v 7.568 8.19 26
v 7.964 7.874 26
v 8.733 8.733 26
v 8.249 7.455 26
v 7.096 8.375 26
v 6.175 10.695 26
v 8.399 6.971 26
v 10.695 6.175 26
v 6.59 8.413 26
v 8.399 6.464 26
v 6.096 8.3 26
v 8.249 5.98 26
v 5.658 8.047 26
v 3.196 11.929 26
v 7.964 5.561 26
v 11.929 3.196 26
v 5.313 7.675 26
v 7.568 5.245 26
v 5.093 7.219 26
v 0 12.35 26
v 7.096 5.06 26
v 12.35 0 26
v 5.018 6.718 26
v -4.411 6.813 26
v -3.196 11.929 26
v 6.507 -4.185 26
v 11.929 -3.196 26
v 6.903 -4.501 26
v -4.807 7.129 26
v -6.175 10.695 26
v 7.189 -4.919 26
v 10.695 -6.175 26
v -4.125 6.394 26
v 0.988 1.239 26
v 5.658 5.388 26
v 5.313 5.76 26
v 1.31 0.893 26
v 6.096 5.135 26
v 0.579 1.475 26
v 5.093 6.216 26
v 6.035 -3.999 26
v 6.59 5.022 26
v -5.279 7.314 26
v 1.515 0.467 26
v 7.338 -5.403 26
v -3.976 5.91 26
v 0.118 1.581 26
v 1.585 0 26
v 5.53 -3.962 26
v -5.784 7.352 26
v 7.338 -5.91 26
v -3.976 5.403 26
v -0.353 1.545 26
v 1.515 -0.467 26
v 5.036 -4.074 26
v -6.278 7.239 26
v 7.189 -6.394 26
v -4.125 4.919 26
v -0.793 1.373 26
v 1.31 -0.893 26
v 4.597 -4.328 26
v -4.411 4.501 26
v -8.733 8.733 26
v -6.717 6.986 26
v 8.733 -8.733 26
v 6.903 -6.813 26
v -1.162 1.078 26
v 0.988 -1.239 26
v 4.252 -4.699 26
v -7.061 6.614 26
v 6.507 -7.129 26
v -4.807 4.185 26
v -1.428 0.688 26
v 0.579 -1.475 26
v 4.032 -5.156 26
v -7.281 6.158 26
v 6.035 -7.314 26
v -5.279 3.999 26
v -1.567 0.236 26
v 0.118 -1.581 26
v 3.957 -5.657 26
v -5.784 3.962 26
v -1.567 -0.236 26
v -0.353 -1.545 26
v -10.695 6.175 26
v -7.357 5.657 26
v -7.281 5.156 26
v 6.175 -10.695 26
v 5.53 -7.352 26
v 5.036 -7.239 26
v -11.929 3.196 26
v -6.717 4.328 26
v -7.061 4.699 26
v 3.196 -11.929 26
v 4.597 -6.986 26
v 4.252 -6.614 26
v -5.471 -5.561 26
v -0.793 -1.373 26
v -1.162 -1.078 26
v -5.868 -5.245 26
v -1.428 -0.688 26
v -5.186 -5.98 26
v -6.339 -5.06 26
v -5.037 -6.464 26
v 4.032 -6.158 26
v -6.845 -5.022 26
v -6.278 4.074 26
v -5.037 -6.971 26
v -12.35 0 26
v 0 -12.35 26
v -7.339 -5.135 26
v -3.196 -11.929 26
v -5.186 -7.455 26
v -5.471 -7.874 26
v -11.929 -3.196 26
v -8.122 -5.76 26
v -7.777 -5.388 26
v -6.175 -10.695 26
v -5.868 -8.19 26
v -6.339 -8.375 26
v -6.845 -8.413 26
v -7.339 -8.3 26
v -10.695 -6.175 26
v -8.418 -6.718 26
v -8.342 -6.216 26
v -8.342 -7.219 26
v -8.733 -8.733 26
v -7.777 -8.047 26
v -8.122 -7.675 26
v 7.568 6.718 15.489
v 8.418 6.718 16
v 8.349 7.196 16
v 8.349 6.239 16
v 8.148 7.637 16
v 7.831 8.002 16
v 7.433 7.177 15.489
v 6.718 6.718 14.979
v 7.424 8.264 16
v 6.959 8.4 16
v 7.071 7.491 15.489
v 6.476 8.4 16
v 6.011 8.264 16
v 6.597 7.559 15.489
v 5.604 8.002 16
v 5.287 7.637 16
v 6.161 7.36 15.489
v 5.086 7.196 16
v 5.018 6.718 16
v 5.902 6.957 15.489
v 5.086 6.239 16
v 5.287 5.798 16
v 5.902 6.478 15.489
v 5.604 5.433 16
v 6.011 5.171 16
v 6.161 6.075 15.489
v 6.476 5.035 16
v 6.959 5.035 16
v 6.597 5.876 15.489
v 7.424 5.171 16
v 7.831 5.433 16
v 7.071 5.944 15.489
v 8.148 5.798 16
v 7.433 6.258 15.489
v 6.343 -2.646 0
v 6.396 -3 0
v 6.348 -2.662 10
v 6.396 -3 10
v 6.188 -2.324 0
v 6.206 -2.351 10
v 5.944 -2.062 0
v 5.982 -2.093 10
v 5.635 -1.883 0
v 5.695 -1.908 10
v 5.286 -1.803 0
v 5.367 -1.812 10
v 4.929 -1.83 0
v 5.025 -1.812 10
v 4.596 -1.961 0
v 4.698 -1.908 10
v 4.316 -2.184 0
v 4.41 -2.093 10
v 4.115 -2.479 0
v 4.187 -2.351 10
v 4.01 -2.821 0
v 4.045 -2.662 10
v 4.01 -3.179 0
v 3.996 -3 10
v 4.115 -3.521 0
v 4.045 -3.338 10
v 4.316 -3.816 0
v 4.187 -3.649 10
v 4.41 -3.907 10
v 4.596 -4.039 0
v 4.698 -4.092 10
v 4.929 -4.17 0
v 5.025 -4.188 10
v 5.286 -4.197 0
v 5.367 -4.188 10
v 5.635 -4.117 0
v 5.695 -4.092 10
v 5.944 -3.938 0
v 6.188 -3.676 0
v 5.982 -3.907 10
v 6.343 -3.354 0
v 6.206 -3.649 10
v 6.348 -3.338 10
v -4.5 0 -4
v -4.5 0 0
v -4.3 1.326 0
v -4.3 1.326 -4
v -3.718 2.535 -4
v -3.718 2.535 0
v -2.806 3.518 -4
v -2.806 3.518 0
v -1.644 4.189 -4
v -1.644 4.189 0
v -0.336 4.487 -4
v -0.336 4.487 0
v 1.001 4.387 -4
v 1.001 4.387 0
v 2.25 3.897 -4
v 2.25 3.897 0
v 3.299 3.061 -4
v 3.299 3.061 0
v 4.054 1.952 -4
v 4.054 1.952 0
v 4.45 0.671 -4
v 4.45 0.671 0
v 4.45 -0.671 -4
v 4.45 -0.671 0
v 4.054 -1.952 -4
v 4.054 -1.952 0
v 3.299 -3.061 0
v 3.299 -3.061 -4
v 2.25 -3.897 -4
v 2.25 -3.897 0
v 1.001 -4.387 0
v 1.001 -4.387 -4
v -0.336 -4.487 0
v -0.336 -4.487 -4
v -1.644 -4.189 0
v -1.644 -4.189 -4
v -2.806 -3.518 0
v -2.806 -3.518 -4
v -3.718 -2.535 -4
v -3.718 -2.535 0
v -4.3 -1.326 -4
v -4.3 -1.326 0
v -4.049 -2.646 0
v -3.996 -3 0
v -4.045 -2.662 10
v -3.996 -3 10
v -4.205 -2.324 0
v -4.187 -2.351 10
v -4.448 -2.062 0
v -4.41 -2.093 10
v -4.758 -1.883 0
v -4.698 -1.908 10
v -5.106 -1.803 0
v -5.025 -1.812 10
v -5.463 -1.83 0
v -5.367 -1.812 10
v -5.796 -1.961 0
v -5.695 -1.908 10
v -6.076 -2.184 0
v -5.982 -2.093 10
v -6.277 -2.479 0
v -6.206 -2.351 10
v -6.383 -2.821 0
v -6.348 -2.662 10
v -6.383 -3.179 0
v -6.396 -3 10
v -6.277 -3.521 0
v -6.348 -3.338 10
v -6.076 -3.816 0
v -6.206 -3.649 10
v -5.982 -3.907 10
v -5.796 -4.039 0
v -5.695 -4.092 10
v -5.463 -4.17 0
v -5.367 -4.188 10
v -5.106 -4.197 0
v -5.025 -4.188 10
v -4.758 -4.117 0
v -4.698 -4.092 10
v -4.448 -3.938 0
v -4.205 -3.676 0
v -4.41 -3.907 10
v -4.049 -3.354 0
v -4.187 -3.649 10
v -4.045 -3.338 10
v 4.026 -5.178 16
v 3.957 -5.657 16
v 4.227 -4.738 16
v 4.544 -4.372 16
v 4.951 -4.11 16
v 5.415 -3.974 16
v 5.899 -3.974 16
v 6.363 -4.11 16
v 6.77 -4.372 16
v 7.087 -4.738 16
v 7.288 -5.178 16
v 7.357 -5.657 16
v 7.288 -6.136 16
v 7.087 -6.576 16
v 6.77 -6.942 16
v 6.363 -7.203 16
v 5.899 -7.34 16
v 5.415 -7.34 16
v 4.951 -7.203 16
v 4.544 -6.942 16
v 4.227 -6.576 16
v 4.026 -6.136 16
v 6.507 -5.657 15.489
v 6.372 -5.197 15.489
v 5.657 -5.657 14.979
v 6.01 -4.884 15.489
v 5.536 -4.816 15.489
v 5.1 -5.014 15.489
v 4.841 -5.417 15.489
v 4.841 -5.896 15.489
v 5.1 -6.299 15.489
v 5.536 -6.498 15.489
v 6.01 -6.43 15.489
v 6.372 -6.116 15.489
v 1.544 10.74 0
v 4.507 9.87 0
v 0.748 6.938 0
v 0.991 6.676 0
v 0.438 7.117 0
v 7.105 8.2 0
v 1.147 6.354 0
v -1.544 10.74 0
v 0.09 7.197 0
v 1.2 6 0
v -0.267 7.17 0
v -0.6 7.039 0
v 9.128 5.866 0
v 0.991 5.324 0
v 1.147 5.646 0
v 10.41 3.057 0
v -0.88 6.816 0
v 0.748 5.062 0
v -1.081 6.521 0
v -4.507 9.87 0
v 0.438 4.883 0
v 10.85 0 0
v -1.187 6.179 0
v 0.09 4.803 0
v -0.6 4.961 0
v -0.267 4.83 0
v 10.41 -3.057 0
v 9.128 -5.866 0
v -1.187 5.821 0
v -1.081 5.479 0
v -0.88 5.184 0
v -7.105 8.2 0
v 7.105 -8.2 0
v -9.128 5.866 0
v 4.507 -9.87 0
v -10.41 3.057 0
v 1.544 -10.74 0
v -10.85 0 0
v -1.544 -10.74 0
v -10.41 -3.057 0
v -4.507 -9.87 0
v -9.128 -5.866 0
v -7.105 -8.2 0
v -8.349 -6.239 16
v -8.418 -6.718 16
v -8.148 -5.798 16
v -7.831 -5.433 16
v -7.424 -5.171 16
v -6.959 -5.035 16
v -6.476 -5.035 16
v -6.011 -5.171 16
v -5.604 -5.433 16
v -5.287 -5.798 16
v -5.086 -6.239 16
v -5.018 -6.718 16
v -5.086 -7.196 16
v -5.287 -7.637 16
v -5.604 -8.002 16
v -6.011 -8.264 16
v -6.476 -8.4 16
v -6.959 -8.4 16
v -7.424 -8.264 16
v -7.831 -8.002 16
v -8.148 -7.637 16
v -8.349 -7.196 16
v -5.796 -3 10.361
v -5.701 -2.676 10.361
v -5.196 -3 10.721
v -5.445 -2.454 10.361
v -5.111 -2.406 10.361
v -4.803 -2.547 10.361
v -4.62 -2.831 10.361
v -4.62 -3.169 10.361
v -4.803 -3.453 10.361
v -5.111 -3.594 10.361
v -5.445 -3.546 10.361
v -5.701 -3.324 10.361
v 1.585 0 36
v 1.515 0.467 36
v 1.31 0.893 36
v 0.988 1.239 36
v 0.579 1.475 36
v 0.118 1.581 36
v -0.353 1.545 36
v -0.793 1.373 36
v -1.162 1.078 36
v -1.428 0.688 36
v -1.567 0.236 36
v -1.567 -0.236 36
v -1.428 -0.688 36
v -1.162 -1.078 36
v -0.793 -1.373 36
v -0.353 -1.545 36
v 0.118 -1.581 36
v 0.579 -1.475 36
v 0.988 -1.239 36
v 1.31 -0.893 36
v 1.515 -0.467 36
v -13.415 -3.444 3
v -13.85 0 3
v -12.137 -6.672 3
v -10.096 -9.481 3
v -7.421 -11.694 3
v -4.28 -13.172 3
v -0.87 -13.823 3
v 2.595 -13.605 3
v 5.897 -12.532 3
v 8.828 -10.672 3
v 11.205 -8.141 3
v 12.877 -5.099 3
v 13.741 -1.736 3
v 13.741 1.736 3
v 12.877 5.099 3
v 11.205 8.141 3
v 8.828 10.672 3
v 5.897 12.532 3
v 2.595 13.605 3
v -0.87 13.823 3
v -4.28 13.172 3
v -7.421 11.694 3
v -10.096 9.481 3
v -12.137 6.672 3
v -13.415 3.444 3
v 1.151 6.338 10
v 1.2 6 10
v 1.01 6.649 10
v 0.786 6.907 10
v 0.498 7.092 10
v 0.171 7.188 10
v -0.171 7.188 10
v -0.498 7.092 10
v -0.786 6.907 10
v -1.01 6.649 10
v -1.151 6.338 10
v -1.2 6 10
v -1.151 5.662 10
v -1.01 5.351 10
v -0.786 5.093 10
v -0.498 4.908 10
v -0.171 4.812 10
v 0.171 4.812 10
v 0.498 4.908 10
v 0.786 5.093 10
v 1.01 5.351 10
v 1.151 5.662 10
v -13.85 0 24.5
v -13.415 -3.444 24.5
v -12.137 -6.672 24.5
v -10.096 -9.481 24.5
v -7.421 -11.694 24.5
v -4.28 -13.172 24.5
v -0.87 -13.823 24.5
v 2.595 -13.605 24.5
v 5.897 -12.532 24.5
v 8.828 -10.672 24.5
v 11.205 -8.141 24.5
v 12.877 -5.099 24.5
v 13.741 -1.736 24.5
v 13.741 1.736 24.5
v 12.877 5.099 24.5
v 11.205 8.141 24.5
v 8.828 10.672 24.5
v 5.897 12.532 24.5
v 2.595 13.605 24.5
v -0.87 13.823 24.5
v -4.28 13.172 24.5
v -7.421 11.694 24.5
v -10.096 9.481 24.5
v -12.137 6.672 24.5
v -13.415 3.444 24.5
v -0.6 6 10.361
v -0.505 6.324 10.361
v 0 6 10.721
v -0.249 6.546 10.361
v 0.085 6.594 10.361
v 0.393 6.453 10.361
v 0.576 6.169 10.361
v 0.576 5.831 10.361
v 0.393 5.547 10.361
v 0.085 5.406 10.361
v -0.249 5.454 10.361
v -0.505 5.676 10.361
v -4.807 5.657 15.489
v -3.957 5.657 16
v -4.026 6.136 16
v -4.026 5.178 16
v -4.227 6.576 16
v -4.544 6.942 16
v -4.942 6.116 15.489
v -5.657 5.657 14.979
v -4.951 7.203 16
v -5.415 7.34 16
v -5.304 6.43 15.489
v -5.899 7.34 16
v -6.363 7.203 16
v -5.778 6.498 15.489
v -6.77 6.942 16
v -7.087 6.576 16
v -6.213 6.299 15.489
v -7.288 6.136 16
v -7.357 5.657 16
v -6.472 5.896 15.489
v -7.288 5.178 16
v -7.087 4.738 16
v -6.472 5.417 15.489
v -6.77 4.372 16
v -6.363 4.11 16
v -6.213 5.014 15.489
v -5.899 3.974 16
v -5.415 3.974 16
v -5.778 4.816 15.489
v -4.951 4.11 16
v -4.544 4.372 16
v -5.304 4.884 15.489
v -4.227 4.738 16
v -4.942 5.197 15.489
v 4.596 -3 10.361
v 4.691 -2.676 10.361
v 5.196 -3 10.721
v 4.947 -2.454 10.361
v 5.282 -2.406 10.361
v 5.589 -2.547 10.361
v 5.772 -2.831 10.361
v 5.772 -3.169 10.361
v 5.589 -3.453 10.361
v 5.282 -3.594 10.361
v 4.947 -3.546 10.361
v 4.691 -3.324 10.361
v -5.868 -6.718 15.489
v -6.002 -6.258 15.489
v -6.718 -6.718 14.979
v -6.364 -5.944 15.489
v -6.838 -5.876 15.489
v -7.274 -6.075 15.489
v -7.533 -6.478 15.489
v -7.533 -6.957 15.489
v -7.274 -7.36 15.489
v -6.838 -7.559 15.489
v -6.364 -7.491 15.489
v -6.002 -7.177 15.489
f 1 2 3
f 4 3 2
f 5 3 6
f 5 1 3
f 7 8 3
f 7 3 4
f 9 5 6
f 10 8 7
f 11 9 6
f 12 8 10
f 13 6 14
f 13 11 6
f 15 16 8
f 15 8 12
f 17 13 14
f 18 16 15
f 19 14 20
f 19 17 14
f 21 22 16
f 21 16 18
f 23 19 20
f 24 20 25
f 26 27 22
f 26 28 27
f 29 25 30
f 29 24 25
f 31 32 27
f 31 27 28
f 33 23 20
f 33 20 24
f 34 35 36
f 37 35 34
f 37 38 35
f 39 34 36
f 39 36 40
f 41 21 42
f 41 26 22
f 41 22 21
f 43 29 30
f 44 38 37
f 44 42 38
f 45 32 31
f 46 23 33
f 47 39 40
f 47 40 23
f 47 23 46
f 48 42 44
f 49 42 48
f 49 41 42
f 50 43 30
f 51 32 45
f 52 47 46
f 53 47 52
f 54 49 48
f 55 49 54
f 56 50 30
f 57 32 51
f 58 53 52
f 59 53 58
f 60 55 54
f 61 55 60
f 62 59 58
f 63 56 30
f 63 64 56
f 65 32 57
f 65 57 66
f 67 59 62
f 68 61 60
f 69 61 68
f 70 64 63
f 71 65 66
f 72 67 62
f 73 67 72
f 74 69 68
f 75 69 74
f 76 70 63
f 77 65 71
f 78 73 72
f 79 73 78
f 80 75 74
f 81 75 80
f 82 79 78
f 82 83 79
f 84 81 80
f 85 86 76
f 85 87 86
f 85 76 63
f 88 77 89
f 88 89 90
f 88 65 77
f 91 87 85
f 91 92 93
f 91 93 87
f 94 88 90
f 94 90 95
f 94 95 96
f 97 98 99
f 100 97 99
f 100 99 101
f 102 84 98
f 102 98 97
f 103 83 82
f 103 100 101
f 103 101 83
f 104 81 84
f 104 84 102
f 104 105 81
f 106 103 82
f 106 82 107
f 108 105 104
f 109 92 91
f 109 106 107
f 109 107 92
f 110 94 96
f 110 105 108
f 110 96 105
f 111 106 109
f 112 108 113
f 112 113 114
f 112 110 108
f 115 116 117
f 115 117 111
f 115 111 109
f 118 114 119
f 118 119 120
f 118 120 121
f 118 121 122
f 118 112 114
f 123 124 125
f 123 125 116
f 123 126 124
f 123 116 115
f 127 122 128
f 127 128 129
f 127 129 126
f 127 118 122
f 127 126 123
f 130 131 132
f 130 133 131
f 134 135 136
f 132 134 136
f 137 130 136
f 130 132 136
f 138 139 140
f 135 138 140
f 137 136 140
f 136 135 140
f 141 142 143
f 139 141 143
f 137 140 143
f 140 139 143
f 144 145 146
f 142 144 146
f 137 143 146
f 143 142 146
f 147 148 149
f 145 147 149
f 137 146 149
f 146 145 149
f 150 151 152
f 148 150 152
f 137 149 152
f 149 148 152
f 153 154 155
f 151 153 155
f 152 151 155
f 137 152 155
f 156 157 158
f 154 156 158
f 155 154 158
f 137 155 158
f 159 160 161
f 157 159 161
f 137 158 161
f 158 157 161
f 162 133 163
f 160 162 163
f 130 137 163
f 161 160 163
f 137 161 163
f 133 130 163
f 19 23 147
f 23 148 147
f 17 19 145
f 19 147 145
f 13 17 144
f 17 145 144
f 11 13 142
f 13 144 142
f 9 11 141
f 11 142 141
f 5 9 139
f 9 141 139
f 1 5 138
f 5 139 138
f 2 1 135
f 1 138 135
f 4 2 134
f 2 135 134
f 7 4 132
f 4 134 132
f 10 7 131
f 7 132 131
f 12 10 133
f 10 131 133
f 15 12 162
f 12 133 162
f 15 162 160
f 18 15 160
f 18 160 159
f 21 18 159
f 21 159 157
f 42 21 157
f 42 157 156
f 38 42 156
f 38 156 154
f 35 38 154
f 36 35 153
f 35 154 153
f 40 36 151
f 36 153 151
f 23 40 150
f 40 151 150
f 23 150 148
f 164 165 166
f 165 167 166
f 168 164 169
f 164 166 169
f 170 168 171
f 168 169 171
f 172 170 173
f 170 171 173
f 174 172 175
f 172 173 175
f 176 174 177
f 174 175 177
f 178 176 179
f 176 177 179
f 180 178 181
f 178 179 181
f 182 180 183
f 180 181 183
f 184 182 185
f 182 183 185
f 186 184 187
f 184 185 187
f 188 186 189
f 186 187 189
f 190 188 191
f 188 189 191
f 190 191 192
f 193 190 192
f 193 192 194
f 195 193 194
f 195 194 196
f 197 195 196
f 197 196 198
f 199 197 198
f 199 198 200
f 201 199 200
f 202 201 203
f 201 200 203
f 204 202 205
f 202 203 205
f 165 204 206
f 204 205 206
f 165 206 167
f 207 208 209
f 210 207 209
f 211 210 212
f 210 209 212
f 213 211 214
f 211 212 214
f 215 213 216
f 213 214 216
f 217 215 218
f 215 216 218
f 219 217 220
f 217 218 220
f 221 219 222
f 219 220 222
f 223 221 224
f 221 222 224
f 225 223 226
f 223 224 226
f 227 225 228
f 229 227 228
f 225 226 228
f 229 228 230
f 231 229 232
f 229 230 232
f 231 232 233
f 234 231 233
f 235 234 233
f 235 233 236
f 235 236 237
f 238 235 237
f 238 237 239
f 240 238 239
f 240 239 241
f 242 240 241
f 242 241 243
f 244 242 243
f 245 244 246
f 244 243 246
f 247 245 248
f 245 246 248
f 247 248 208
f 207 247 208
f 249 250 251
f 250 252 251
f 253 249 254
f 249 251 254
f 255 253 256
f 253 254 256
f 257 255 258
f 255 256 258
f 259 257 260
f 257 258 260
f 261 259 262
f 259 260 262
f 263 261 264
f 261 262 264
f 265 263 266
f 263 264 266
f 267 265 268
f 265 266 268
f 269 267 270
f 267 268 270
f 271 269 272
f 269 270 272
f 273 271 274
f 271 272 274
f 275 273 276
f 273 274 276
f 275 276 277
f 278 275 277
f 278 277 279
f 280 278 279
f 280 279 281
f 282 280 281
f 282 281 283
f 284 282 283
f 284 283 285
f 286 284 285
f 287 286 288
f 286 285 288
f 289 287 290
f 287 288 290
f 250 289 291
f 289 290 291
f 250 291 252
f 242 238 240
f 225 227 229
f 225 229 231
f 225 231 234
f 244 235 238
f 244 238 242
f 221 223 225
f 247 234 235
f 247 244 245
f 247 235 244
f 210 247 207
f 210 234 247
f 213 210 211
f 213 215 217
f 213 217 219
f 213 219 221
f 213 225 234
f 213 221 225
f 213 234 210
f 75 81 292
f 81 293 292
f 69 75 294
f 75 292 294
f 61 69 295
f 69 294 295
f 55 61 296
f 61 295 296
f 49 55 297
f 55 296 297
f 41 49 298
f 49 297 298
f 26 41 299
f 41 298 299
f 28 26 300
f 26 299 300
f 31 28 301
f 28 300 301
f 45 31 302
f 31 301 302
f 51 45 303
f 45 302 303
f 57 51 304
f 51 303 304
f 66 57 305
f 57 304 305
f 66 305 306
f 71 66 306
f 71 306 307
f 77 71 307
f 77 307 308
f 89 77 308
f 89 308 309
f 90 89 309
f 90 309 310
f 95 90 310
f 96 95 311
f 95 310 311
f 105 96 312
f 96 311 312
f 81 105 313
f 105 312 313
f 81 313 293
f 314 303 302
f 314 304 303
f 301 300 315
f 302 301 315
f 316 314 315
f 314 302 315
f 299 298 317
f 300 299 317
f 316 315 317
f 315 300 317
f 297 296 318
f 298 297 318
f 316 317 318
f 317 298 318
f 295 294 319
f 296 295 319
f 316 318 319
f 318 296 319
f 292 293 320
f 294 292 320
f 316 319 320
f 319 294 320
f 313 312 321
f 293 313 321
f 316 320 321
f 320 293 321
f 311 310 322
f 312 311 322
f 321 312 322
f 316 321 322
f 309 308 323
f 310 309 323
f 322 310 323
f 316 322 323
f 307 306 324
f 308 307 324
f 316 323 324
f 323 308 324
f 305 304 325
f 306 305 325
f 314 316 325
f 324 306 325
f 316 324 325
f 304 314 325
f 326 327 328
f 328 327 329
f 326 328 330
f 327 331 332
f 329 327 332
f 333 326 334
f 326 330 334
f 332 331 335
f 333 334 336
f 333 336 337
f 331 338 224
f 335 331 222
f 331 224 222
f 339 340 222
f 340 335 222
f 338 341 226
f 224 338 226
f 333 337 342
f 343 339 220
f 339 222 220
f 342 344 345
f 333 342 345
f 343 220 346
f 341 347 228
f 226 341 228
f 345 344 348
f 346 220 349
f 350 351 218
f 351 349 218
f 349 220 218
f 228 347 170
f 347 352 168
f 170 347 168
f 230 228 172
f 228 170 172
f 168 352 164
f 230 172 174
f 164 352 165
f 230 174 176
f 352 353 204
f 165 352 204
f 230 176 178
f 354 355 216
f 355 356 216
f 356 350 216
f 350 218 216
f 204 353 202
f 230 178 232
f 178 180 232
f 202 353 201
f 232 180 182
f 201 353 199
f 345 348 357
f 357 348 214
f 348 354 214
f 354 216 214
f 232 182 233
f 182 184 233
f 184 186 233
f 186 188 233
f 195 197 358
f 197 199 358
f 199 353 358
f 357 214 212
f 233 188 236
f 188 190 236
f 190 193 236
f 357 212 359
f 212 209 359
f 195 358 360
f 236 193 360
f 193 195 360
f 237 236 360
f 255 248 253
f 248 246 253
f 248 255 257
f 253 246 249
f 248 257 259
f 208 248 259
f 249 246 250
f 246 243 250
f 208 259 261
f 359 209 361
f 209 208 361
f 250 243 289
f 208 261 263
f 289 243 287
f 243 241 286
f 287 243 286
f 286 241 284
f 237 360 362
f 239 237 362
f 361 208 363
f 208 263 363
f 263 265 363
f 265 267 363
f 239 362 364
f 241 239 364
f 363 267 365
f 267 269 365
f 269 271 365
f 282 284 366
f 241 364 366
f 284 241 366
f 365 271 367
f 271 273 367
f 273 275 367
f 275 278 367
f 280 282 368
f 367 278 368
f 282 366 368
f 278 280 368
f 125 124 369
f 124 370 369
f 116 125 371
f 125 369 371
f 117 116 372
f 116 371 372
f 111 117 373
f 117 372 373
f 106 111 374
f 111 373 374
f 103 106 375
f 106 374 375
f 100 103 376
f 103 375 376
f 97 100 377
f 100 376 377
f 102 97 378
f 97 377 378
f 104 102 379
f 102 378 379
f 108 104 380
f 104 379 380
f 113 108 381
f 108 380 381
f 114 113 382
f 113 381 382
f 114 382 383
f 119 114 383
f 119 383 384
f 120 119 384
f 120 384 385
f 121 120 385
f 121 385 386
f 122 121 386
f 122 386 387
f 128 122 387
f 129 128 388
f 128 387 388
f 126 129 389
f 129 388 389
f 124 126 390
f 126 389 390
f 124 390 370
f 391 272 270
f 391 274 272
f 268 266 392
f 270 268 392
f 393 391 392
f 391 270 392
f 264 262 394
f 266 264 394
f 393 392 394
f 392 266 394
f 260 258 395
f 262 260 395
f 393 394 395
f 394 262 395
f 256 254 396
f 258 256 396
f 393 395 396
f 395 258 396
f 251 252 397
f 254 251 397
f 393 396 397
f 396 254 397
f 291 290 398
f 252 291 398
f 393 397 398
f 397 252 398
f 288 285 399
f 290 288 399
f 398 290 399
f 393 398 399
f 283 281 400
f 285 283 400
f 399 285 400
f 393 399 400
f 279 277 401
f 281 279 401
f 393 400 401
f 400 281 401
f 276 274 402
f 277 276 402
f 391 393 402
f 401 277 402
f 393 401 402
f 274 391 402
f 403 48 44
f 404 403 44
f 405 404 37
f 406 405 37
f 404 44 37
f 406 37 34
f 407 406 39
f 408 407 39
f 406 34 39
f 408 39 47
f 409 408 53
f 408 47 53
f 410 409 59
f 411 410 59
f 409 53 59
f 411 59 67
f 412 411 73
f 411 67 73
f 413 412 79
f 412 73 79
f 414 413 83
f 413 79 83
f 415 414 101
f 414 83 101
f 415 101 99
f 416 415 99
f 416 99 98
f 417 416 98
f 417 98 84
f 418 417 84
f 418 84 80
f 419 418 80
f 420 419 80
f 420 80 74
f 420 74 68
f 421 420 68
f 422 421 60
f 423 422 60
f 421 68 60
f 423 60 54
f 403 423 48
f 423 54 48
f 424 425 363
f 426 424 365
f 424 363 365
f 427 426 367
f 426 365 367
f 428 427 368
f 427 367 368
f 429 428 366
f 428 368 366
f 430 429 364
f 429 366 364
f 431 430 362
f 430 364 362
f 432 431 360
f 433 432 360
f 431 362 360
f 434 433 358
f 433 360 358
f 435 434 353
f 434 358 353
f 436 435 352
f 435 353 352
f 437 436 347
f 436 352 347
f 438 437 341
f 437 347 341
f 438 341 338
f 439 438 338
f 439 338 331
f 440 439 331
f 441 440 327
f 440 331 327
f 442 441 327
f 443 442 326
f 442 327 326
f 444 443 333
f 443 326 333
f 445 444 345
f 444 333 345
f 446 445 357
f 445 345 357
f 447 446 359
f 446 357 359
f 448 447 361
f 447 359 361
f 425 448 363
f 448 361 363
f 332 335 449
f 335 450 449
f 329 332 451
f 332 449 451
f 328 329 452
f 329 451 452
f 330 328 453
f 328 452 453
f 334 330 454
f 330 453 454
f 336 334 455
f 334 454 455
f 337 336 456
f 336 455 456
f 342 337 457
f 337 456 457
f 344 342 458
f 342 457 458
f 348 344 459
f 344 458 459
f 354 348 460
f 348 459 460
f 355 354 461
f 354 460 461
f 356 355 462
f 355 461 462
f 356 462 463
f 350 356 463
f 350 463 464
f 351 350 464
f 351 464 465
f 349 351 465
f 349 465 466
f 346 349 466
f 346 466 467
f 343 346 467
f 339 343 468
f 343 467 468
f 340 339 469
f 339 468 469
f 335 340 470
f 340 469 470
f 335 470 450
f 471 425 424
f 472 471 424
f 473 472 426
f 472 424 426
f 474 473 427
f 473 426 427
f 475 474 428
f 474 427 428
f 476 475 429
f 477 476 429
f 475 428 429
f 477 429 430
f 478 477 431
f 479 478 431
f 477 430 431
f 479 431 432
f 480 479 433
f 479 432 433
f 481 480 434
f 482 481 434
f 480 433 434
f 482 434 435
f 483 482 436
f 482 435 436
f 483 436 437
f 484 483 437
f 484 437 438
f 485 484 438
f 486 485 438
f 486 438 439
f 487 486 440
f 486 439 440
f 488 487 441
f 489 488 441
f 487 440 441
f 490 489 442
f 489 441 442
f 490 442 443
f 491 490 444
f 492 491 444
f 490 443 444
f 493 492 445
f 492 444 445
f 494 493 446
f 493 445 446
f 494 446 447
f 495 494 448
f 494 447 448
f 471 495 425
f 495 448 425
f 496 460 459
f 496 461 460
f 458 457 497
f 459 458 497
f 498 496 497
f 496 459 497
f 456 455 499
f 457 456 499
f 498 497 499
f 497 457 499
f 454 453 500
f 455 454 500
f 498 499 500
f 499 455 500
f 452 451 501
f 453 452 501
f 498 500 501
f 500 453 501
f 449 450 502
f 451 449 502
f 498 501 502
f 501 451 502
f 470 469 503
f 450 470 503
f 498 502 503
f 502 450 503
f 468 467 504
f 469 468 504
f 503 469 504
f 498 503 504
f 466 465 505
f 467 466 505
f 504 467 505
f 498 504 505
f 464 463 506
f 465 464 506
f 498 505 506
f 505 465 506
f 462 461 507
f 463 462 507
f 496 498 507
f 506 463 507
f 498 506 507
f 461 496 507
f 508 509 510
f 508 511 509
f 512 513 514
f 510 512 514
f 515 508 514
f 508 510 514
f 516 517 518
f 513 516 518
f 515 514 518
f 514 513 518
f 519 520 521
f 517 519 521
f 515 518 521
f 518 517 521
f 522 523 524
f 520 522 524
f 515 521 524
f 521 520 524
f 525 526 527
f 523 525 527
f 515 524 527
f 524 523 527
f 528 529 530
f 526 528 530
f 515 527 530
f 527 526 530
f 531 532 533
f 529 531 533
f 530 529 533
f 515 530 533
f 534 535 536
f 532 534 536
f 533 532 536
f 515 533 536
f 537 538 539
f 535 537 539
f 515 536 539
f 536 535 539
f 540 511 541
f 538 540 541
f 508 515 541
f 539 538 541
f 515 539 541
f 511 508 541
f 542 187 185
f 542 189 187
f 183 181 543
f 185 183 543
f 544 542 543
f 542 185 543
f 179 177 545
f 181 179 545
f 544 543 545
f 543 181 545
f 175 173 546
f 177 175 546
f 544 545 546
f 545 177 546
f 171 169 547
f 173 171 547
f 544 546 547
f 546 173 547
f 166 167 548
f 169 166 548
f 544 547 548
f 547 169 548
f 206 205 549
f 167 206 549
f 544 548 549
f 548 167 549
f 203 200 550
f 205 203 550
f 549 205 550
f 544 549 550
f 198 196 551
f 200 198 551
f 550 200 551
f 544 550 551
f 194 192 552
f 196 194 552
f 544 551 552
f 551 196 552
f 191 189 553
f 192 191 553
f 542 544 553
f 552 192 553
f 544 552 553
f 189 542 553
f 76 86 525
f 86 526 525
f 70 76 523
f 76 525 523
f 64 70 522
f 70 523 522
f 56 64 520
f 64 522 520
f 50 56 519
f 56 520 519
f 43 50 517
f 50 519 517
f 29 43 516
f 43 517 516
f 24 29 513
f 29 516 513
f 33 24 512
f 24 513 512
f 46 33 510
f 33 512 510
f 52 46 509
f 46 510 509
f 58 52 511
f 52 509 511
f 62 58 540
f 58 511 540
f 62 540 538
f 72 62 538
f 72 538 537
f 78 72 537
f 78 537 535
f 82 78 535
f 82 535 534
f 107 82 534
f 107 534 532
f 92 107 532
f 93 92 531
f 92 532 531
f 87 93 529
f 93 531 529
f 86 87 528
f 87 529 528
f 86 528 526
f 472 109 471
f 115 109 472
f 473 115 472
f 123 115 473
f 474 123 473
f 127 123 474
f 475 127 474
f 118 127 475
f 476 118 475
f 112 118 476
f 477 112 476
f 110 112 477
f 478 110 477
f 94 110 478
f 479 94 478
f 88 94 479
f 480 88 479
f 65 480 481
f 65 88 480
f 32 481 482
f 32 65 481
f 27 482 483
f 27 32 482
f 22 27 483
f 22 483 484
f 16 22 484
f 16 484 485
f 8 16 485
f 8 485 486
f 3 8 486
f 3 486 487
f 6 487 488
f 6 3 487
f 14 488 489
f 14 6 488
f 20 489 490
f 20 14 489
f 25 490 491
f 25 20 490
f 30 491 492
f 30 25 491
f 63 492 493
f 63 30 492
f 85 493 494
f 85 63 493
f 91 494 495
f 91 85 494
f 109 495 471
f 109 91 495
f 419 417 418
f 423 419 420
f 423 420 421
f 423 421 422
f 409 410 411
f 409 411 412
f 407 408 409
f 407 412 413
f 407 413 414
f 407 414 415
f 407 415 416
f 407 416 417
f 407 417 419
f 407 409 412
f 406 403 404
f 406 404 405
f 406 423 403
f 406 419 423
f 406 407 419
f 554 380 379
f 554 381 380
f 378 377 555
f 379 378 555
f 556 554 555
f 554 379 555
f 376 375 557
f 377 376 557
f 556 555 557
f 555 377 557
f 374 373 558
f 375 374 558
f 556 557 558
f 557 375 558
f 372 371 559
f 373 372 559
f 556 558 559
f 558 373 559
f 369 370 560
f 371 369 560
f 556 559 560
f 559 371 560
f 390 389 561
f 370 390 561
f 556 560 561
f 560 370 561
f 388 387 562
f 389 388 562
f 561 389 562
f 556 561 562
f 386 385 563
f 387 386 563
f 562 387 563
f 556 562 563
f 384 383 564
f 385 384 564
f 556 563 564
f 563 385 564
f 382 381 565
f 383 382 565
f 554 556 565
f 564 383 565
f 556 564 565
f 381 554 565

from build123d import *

# Parameters (mm, degrees)
SKETCH1_R                = 13.85
BOSS_EXTRUDE1_DEPTH      = 26
CHAMFER1_SIZE            = 1.5
CHAMFER2_SIZE            = 3
SKETCH2_R                = 4.5
BOSS_EXTRUDE2_DEPTH      = 4
SKETCH3_R                = 1.585
BOSS_EXTRUDE3_DEPTH      = 10
M3_CLEARANCE_HOLE1_D     = 3.4
M3_CLEARANCE_HOLE1_DEPTH = 10
M3_CLEARANCE_HOLE1_TIP   = 1.021463052
M2_CLEARANCE_HOLE1_D     = 2.4
M2_CLEARANCE_HOLE1_DEPTH = 10
M2_CLEARANCE_HOLE1_TIP   = 0.721032743


with BuildPart() as part:
    # Sketch1 → Boss-Extrude1 (new body)
    with BuildSketch(Plane.XY):
        with Locations(Location((0, 0, 0), (0, 0, 180))):
            Circle(SKETCH1_R)
    extrude(amount=BOSS_EXTRUDE1_DEPTH)

    # Chamfer1
    chamfer1_edges = [part.edges().sort_by_distance(p)[0] for p in [
        (13.85, 0, 26),
    ]]
    chamfer(chamfer1_edges, length=CHAMFER1_SIZE)

    # Chamfer2
    chamfer2_edges = [part.edges().sort_by_distance(p)[0] for p in [
        (13.85, 0, 0),
    ]]
    chamfer(chamfer2_edges, length=CHAMFER2_SIZE)

    # Sketch2 → Boss-Extrude2 (add)
    with BuildSketch(Plane(origin=(0, 0, 0), x_dir=(-1, 0, 0), z_dir=(0, 0, -1))):
        Circle(SKETCH2_R)
    extrude(amount=BOSS_EXTRUDE2_DEPTH)

    # Sketch3 → Boss-Extrude3 (add)
    with BuildSketch(Plane.XY.offset(26)):
        Circle(SKETCH3_R)
    extrude(amount=BOSS_EXTRUDE3_DEPTH)

    # M3 Clearance Hole1
    with Locations(Plane.XY.offset(26)):
        with Locations((-5.656854249, 5.656854249), (6.717514421, 6.717514421), (5.656854249, -5.656854249), (-6.717514421, -6.717514421)):
            Hole(M3_CLEARANCE_HOLE1_D / 2, depth=M3_CLEARANCE_HOLE1_DEPTH)
            with Locations((0, 0, -(M3_CLEARANCE_HOLE1_DEPTH + M3_CLEARANCE_HOLE1_TIP / 2))):  # 118° drill point
                Cone(0, M3_CLEARANCE_HOLE1_D / 2, M3_CLEARANCE_HOLE1_TIP, mode=Mode.SUBTRACT)

    # M2 Clearance Hole1
    with Locations(Plane(origin=(0, 0, 0), x_dir=(-1, 0, 0), z_dir=(0, 0, -1))):
        with Locations((0, 6), (5.196152423, -3), (-5.196152423, -3)):
            Hole(M2_CLEARANCE_HOLE1_D / 2, depth=M2_CLEARANCE_HOLE1_DEPTH)
            with Locations((0, 0, -(M2_CLEARANCE_HOLE1_DEPTH + M2_CLEARANCE_HOLE1_TIP / 2))):  # 118° drill point
                Cone(0, M2_CLEARANCE_HOLE1_D / 2, M2_CLEARANCE_HOLE1_TIP, mode=Mode.SUBTRACT)


solid = part.part
